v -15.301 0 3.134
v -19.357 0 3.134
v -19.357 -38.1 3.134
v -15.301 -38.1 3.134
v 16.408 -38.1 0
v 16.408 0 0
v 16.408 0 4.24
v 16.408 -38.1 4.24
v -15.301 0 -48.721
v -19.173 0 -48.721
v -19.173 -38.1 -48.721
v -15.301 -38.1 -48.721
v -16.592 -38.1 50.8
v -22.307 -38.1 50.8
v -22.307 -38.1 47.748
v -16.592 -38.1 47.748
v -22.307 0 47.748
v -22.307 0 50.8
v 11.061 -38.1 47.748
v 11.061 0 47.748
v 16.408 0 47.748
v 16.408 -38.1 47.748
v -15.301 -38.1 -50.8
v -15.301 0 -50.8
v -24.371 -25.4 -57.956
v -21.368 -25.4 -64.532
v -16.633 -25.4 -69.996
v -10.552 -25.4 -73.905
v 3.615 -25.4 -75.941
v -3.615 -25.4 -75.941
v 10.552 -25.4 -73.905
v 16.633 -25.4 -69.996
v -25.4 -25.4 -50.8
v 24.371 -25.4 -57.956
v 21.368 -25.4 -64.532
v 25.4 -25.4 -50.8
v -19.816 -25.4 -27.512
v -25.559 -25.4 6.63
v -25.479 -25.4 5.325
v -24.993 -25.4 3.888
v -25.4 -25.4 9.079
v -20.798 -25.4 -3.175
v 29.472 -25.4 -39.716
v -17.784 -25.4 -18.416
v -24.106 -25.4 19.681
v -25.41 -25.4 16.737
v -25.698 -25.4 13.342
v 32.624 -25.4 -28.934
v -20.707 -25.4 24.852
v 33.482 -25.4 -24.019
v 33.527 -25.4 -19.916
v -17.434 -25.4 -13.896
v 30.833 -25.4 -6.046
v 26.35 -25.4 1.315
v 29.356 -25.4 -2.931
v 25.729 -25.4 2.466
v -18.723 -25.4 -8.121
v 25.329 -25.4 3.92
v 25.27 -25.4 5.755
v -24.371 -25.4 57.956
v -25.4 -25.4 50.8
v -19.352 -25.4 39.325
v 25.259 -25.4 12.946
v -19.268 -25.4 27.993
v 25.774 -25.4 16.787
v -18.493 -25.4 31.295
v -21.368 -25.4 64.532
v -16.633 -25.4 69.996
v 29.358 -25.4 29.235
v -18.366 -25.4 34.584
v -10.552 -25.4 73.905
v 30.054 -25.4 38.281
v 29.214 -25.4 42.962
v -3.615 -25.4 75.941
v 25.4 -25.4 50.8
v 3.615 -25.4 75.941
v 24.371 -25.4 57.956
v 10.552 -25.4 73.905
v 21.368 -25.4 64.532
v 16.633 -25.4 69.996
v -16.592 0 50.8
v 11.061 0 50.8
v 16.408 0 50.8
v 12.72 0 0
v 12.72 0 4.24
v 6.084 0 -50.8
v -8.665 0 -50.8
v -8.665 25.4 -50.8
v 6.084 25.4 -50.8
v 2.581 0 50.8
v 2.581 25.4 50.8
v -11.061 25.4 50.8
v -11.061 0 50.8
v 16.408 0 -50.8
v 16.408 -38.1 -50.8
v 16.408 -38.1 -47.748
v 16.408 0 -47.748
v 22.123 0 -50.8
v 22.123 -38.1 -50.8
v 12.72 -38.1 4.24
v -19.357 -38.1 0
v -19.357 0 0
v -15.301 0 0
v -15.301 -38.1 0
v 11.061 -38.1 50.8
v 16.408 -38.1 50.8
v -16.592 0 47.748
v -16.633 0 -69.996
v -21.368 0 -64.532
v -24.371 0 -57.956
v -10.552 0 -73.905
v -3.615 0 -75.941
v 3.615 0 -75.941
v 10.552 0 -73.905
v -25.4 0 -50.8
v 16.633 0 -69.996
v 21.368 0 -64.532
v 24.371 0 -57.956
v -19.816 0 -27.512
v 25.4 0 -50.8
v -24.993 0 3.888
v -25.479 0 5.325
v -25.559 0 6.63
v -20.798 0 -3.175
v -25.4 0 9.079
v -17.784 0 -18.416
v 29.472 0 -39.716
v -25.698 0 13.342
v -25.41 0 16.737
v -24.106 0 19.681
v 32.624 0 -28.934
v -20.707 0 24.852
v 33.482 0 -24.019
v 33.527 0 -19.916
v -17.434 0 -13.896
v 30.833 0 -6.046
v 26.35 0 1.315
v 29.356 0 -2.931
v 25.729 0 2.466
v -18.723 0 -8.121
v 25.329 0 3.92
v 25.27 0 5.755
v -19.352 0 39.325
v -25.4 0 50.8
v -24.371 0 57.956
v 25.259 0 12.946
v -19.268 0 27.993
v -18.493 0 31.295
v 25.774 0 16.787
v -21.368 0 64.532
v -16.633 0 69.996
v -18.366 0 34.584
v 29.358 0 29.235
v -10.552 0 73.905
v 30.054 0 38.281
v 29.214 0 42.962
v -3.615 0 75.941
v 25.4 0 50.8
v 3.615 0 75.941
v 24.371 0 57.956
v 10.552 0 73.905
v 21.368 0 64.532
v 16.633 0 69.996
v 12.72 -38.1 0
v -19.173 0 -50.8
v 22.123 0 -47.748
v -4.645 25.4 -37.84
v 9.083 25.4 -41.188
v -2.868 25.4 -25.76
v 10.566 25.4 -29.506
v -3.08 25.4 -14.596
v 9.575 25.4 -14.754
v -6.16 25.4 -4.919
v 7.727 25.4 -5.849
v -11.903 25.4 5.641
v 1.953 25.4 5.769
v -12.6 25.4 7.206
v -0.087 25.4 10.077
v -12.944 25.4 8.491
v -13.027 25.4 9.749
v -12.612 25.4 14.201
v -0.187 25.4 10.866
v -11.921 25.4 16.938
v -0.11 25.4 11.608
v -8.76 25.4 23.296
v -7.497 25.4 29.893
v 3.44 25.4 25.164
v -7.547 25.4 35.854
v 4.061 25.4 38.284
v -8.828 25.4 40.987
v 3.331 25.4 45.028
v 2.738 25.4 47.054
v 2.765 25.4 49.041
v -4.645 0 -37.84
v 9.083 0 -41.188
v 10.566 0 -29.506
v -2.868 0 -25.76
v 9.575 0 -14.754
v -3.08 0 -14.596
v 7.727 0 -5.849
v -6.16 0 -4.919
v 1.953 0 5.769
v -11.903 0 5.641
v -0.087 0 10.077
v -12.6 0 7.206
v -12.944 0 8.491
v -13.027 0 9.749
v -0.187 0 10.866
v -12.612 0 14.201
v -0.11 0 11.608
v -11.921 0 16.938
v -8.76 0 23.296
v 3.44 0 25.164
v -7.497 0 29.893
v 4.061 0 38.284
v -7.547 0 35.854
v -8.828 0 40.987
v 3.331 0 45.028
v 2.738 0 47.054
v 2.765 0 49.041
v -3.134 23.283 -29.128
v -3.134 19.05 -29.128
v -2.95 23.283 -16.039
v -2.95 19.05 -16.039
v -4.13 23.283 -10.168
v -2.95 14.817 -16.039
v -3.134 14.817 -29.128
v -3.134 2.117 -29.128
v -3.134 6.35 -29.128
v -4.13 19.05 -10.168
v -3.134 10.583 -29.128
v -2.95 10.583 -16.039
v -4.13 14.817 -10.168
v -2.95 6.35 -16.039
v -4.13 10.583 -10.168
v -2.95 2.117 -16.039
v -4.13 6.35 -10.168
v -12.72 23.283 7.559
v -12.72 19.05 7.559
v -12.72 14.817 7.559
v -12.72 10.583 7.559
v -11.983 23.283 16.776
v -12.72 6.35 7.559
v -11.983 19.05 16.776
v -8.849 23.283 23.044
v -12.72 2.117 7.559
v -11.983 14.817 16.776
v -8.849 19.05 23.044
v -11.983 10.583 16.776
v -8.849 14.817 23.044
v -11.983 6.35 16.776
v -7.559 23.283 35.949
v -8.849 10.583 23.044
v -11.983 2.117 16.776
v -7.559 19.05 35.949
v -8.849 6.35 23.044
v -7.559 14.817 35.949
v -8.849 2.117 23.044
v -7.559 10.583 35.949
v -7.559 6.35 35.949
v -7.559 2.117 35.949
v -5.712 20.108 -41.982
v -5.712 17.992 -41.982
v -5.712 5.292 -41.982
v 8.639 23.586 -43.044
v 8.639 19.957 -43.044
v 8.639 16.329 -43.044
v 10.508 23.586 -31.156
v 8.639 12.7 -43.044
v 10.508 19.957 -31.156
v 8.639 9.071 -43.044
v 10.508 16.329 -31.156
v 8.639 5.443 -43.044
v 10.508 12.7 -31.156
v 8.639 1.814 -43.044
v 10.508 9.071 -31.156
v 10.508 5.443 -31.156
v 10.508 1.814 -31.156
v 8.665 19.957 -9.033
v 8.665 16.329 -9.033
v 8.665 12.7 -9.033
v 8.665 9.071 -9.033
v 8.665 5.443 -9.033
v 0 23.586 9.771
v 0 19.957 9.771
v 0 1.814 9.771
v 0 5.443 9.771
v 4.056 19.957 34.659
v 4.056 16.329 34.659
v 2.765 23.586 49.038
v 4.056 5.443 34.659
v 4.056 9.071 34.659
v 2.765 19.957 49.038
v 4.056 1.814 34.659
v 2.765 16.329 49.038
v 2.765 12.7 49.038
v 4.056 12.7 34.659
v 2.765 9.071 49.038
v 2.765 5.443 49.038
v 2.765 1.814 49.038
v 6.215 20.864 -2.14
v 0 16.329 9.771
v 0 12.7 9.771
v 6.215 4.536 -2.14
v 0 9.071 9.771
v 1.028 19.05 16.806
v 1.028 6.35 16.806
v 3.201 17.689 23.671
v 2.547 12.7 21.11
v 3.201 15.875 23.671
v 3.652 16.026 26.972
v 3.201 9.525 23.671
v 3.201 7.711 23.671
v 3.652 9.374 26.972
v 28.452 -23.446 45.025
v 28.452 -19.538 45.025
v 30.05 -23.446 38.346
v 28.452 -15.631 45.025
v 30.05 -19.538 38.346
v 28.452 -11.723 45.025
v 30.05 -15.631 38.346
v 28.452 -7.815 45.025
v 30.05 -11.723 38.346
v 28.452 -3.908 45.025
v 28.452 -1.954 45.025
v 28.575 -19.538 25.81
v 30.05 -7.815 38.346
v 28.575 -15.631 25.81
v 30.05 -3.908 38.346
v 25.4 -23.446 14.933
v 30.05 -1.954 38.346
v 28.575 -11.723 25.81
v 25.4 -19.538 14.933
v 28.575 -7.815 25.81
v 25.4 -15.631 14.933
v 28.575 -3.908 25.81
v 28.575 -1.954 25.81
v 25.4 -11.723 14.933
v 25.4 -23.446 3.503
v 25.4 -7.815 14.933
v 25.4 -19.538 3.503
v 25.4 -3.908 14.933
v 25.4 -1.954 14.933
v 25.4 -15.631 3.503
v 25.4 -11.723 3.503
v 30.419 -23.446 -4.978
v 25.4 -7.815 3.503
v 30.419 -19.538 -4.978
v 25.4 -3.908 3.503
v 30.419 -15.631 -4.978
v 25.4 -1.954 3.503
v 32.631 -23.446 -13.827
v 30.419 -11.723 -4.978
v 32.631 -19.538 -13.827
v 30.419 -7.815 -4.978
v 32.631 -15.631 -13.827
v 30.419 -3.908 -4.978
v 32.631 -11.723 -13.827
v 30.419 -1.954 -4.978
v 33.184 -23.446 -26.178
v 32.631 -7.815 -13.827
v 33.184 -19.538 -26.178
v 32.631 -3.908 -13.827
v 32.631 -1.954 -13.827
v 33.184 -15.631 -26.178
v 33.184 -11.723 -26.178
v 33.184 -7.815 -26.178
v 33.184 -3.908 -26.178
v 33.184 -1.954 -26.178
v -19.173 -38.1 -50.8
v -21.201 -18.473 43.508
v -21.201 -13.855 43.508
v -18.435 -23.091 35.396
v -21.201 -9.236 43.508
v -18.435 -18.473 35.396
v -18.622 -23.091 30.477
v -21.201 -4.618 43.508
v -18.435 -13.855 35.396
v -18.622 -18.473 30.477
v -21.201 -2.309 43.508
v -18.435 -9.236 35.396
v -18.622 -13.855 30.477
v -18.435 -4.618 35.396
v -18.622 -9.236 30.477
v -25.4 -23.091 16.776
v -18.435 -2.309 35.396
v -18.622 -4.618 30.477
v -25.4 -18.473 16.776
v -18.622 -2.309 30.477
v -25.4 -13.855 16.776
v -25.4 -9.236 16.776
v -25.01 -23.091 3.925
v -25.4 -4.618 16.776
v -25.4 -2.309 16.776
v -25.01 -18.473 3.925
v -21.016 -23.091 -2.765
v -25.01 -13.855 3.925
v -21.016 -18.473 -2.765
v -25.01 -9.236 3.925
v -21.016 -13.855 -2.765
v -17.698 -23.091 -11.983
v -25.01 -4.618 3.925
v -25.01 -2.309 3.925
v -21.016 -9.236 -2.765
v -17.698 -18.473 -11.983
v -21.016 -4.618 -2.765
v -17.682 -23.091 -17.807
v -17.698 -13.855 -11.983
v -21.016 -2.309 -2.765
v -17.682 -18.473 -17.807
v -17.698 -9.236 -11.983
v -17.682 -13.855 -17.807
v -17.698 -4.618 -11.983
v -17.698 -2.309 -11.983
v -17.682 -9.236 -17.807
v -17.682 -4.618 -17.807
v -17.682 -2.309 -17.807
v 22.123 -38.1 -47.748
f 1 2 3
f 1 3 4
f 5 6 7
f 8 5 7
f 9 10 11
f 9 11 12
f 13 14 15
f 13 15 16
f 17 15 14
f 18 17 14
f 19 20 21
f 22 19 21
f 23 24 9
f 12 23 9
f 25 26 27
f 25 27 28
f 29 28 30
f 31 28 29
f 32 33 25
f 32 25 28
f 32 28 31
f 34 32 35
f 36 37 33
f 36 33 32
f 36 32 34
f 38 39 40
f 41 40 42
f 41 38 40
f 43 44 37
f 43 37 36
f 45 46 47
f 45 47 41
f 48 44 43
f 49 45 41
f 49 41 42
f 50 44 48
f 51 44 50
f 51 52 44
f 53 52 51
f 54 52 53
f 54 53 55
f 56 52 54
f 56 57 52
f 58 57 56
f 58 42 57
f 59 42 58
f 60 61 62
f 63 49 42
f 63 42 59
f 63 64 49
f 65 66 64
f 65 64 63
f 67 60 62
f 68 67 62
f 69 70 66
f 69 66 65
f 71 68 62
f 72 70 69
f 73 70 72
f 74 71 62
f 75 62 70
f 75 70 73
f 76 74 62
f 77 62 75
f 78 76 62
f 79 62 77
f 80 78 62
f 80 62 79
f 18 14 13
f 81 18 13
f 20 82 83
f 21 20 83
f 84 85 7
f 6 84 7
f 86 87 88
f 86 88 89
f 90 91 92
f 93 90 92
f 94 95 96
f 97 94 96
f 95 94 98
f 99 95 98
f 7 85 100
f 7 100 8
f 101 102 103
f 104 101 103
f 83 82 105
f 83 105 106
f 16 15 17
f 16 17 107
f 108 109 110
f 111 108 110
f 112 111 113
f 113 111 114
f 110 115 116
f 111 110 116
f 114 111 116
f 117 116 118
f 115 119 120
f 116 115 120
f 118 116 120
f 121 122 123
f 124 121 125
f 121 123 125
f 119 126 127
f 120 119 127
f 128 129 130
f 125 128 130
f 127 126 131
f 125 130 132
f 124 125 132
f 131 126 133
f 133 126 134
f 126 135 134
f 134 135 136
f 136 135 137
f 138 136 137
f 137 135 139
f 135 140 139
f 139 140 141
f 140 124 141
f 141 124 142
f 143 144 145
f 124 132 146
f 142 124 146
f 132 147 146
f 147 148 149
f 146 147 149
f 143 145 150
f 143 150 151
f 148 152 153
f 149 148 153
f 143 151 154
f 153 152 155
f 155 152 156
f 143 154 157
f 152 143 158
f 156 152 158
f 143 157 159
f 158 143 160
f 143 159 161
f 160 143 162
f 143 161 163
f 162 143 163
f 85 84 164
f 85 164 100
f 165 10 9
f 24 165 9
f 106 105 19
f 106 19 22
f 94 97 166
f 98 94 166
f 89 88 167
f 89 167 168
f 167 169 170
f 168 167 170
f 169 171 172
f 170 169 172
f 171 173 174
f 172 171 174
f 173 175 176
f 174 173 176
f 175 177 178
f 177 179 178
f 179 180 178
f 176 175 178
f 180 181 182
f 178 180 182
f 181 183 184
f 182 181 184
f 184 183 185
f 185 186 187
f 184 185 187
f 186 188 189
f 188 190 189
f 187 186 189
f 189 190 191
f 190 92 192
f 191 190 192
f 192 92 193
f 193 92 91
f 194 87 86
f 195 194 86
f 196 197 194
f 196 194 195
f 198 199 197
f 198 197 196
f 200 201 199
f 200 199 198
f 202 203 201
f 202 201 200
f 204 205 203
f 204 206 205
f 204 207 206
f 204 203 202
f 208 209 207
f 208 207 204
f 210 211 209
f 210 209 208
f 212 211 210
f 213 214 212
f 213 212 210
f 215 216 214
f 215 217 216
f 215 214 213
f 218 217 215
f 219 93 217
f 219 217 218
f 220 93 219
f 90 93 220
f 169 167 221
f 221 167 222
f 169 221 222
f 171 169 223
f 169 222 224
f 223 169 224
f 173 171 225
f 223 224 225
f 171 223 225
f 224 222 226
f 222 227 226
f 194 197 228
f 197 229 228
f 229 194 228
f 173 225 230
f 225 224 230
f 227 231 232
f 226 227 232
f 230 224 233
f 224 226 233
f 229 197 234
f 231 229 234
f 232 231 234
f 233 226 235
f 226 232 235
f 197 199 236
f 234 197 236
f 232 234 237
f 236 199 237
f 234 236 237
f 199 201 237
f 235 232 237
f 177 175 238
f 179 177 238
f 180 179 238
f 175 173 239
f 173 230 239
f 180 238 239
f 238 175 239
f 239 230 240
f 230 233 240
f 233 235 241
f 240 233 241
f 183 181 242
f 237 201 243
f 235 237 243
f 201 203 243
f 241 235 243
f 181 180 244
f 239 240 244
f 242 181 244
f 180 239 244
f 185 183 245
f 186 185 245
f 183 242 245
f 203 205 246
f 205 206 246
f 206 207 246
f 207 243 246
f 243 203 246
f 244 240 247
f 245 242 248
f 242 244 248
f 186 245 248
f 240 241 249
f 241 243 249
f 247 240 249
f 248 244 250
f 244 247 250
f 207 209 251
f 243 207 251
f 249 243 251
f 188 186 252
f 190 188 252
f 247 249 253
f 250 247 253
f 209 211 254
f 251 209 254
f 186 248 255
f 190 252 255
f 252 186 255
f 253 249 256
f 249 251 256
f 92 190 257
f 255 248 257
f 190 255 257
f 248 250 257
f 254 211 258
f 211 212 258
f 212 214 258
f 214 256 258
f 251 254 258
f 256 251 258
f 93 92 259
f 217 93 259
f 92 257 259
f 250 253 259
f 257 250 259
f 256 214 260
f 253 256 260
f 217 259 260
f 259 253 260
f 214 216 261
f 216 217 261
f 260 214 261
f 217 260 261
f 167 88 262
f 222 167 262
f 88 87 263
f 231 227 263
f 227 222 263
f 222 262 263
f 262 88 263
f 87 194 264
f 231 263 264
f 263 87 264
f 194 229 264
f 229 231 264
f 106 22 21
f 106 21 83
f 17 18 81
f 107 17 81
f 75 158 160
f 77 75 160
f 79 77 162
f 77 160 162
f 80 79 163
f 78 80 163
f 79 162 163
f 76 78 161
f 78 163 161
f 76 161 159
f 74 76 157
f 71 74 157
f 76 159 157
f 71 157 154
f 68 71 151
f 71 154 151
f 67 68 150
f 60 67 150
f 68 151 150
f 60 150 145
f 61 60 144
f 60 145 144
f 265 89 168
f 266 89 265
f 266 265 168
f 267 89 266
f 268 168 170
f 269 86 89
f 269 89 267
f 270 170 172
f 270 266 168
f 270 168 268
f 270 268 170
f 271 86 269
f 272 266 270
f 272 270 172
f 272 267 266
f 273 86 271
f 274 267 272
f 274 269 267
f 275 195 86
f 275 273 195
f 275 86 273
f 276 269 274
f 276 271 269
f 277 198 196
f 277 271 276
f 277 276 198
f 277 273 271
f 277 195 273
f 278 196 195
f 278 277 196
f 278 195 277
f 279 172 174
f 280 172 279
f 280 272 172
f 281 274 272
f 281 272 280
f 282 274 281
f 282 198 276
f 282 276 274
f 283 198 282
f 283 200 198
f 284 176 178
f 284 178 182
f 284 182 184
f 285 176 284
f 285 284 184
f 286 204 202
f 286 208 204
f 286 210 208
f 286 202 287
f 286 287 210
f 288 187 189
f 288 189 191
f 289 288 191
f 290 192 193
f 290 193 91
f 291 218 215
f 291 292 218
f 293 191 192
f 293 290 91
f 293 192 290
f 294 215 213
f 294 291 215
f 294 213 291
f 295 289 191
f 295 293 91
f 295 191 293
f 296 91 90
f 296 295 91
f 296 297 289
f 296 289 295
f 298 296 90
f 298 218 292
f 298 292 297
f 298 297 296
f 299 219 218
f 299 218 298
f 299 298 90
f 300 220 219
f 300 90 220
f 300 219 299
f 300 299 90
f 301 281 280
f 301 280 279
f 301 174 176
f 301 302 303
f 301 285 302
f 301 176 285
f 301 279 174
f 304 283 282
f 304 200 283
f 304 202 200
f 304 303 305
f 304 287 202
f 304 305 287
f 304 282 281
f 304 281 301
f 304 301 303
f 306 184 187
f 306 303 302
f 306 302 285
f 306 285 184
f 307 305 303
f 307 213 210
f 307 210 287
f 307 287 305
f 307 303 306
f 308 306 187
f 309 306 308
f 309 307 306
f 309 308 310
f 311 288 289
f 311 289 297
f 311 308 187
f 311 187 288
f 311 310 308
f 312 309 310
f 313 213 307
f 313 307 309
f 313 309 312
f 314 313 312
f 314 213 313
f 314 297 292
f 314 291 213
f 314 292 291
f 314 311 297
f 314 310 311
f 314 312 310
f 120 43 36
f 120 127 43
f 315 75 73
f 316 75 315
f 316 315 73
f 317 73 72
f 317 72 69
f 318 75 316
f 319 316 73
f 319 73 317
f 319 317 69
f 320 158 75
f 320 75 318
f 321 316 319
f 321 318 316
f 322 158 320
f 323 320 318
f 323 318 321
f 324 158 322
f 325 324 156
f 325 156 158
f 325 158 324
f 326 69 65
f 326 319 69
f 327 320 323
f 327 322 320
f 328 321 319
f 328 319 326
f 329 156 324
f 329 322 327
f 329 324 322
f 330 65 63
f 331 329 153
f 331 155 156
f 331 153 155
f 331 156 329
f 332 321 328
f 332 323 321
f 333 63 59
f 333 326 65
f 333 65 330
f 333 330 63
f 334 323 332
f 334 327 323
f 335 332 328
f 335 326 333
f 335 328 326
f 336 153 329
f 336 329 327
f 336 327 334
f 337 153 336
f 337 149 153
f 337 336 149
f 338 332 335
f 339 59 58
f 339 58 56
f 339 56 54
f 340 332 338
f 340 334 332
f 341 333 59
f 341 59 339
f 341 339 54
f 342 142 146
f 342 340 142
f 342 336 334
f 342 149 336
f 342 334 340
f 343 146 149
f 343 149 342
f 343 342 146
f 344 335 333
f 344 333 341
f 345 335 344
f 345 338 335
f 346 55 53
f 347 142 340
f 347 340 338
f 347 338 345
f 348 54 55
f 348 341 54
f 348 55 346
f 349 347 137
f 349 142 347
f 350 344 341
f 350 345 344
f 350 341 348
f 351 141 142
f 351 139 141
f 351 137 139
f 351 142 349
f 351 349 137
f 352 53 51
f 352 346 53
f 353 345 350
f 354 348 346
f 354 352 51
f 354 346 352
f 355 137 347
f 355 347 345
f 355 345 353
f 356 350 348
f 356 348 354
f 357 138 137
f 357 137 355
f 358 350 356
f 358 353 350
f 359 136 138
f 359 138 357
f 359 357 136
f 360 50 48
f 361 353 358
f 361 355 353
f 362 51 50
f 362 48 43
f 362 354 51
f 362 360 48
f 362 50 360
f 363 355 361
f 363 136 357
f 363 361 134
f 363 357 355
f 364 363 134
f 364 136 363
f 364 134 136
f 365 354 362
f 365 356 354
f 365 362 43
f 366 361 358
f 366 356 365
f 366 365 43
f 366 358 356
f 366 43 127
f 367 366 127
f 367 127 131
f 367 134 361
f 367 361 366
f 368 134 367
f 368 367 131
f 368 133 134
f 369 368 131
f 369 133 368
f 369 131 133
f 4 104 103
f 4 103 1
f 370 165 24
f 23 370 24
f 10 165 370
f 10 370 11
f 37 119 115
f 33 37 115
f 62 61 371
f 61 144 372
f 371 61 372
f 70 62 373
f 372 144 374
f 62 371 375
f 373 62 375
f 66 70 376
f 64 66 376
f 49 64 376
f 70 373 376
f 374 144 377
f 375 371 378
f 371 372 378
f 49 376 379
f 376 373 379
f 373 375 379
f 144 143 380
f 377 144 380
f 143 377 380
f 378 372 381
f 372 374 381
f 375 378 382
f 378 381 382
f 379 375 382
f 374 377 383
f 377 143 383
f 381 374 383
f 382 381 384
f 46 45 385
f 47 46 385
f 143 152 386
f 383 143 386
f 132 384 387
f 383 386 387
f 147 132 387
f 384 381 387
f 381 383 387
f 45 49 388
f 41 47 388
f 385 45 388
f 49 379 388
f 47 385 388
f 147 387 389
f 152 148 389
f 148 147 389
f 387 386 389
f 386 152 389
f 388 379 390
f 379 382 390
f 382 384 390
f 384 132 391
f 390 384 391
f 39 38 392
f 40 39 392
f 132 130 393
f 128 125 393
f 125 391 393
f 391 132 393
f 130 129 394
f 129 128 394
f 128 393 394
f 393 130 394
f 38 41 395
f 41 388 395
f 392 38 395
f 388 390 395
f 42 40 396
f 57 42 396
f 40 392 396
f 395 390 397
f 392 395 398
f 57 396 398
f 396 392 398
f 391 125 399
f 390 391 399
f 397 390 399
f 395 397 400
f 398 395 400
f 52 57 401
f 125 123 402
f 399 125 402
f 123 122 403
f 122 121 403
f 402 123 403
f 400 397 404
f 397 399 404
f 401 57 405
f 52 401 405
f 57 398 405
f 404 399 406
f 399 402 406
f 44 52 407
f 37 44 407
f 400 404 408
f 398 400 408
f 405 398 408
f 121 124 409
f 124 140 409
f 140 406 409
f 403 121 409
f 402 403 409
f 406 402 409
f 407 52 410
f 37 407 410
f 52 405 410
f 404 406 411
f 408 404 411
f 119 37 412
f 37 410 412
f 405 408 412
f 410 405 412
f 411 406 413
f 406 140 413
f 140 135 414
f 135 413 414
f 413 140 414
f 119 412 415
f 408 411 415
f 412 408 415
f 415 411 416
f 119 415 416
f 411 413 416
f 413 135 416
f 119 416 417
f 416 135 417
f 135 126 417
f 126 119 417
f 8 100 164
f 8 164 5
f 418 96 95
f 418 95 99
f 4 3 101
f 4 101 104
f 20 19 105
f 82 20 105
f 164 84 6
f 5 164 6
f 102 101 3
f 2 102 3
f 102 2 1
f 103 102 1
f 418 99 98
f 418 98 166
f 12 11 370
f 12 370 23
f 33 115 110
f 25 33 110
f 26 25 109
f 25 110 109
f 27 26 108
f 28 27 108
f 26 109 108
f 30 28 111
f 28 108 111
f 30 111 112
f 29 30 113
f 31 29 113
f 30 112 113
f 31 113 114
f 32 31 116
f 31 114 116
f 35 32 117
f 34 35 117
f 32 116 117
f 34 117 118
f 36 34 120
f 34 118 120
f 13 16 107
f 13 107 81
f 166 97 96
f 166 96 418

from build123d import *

# Parameters (mm, degrees)
F0_W     = 3.687097691
F0_H     = 4.2401612736
F0_W_2   = 4.0558064356
F0_H_2   = 3.1340322457
F0_W_3   = 5.7149995118
F0_H_3   = 3.0520937026
F0_W_4   = 3.871451132
F0_H_4   = 2.0791524881
F0_W_5   = 5.7150013745
F0_W_6   = 5.3462898359
F1_DEPTH = 25.4
F2_DEPTH = 25.4
F3_DEPTH = 25.4
F4_DEPTH = 38.1


with BuildPart() as f1:
    # F0 (on Front) → F1 (new body)
    with BuildSketch(Plane.XZ):
        with BuildLine():
            ThreePointArc((-25.4, -50.8), (0, -76.2), (25.4, -50.8))
            Line((25.4, -50.8), (22.1225824207, -50.8))
            Line((22.1225824207, -50.8), (16.4075810462, -50.8))
            Line((16.4075810462, -50.8), (6.0837119818, -50.8))
            Line((6.0837119818, -50.8), (-8.6646769196, -50.8))
            Line((-8.6646769196, -50.8), (-15.3014520183, -50.8))
            Line((-15.3014520183, -50.8), (-19.1729031503, -50.8))
            Line((-19.1729031503, -50.8), (-25.4, -50.8))
        make_face()
        with BuildLine():
            add(Edge.make_bspline(
                [(25.4, 50.8), (26.4777169783, 48.9479202677), (28.6861178129, 45.1527360877), (30.6932831349, 38.2079324244), (29.2102996032, 25.6833194496), (24.6181151455, 15.2644920213), (25.7208382238, 8.8851894458), (24.8210743035, 3.3793927812), (27.3376351659, -0.1317957862), (31.0361416521, -4.8152447407), (32.6289703178, -13.8253537267), (33.7770047901, -20.2747103968), (33.428230529, -26.4357670674), (30.3215961917, -37.8680055499), (27.0946961941, -46.3470134235), (25.4, -50.8)],
                knots=[0, 0, 0, 0, 0.0692376704, 0.1418781853, 0.2392837533, 0.3315708581, 0.4002107054, 0.4625003579, 0.5171786982, 0.583671378, 0.6664731761, 0.7364677518, 0.8031231248, 0.8966046387, 1, 1, 1, 1], degree=3))
            Line((25.4, 50.8), (16.4075810462, 50.8))
            Line((16.4075810462, 50.8), (16.4075810462, 47.7479062974))
            Line((16.4075810462, 47.7479062974), (11.0612912104, 47.7479062974))
            Line((11.0612912104, 47.7479062974), (11.0612912104, 50.8))
            Line((11.0612912104, 50.8), (2.5809679646, 50.8))
            add(Edge.make_bspline(
                [(6.0837119818, -50.8), (6.7526639673, -49.080617066), (8.4312184516, -44.7662895858), (11.3526863866, -31.110646258), (9.7718678352, -16.7741945721), (8.9898940513, -8.9270108424), (5.746817019, -0.2348690969), (-0.5661221974, 9.6149802874), (0.0008754514, 12.054506702), (1.1370686549, 18.126460212), (3.4894802849, 22.4144521985), (4.2460147527, 34.4624233221), (3.960019898, 44.2593532606), (2.5398283889, 46.6632712676), (2.8657296807, 49.0471311706), (2.6723084934, 50.2377475739), (2.5809679646, 50.8)],
                knots=[0, 0, 0, 0, 0.0680835046, 0.1708371819, 0.2755848247, 0.3513981135, 0.4367786008, 0.5279622658, 0.5704266042, 0.6357952172, 0.6975722078, 0.7934500663, 0.8792600663, 0.9226956826, 0.963494086, 1, 1, 1, 1], degree=3))
            Line((6.0837119818, -50.8), (16.4075810462, -50.8))
            Line((16.4075810462, -50.8), (16.4075810462, -47.7479062974))
            Line((16.4075810462, -47.7479062974), (22.1225824207, -47.7479062974))
            Line((22.1225824207, -47.7479062974), (22.1225824207, -50.8))
            Line((22.1225824207, -50.8), (25.4, -50.8))
        make_face()
        with Locations((14.5640322007, 2.1200806368)):
            Rectangle(F0_W, F0_H, mode=Mode.SUBTRACT)
        with BuildLine():
            Line((-22.3069358617, 50.8), (-25.4, 50.8))
            add(Edge.make_bspline(
                [(-25.4, 50.8), (-23.9457888424, 48.4062601984), (-21.0240229952, 43.5968161487), (-17.5382201021, 35.4945567937), (-19.2672156417, 25.1355979551), (-26.9197620067, 17.5072559241), (-24.8862082187, 9.032964073), (-26.3256337578, 4.7152512749), (-20.356751104, -2.5534247793), (-17.4203871867, -11.891004327), (-17.2704408034, -16.799434963), (-19.7618335753, -27.3251135996), (-23.2563408131, -41.8747303107), (-25.4, -50.8)],
                knots=[0, 0, 0, 0, 0.0868305692, 0.1744578772, 0.2688447789, 0.3645550375, 0.4478464969, 0.508128426, 0.5974149732, 0.6911047095, 0.7553911578, 0.8499479452, 1, 1, 1, 1], degree=3))
            Line((-25.4, -50.8), (-19.1729031503, -50.8))
            Line((-19.1729031503, -50.8), (-19.1729031503, -48.7208475119))
            Line((-19.1729031503, -48.7208475119), (-15.3014520183, -48.7208475119))
            Line((-15.3014520183, -48.7208475119), (-15.3014520183, -50.8))
            Line((-15.3014520183, -50.8), (-8.6646769196, -50.8))
            add(Edge.make_bspline(
                [(-8.6646769196, -50.8), (-7.8882136411, -48.7208475119), (-5.9978741559, -43.6590446512), (-2.4524628144, -29.5189412564), (-2.8134786099, -16.0801708021), (-3.4674009438, -11.6014648726), (-7.2501120433, -1.4562577191), (-13.4067600488, 7.2161554479), (-12.8603591818, 11.3475544545), (-12.4979329814, 17.3130331381), (-7.8686094851, 22.6070259059), (-6.7588523591, 36.2531826531), (-9.6606783541, 42.5298504496), (-10.5829903078, 47.9757970771), (-11.061290279, 50.8)],
                knots=[0, 0, 0, 0, 0.0775376634, 0.1887693993, 0.2924121888, 0.3530814771, 0.4470014848, 0.5397176399, 0.5961130824, 0.6628348922, 0.7386673918, 0.8418289129, 0.917974362, 1, 1, 1, 1], degree=3))
            Line((-11.061290279, 50.8), (-16.5919363499, 50.8))
            Line((-16.5919363499, 50.8), (-16.5919363499, 47.7479062974))
            Line((-16.5919363499, 47.7479062974), (-22.3069358617, 47.7479062974))
            Line((-22.3069358617, 47.7479062974), (-22.3069358617, 50.8))
        make_face()
        with Locations((-17.3293552361, 1.5670161229)):
            Rectangle(F0_W_2, F0_H_2, mode=Mode.SUBTRACT)
        with BuildLine():
            Line((16.4075810462, 50.8), (25.4, 50.8))
            ThreePointArc((25.4, 50.8), (0, 76.2), (-25.4, 50.8))
            Line((-25.4, 50.8), (-22.3069358617, 50.8))
            Line((-22.3069358617, 50.8), (-16.5919363499, 50.8))
            Line((-16.5919363499, 50.8), (-11.061290279, 50.8))
            Line((-11.061290279, 50.8), (2.5809679646, 50.8))
            Line((2.5809679646, 50.8), (11.0612912104, 50.8))
            Line((11.0612912104, 50.8), (16.4075810462, 50.8))
        make_face()
        with Locations((-19.4494361058, 49.2739531487)):
            Rectangle(F0_W_3, F0_H_3)
        with BuildLine():
            add(Edge.make_bspline(
                [(6.0837119818, -50.8), (6.7526639673, -49.080617066), (8.4312184516, -44.7662895858), (11.3526863866, -31.110646258), (9.7718678352, -16.7741945721), (8.9898940513, -8.9270108424), (5.746817019, -0.2348690969), (-0.5661221974, 9.6149802874), (0.0008754514, 12.054506702), (1.1370686549, 18.126460212), (3.4894802849, 22.4144521985), (4.2460147527, 34.4624233221), (3.960019898, 44.2593532606), (2.5398283889, 46.6632712676), (2.8657296807, 49.0471311706), (2.6723084934, 50.2377475739), (2.5809679646, 50.8)],
                knots=[0, 0, 0, 0, 0.0680835046, 0.1708371819, 0.2755848247, 0.3513981135, 0.4367786008, 0.5279622658, 0.5704266042, 0.6357952172, 0.6975722078, 0.7934500663, 0.8792600663, 0.9226956826, 0.963494086, 1, 1, 1, 1], degree=3))
            Line((2.5809679646, 50.8), (-11.061290279, 50.8))
            add(Edge.make_bspline(
                [(-8.6646769196, -50.8), (-7.8882136411, -48.7208475119), (-5.9978741559, -43.6590446512), (-2.4524628144, -29.5189412564), (-2.8134786099, -16.0801708021), (-3.4674009438, -11.6014648726), (-7.2501120433, -1.4562577191), (-13.4067600488, 7.2161554479), (-12.8603591818, 11.3475544545), (-12.4979329814, 17.3130331381), (-7.8686094851, 22.6070259059), (-6.7588523591, 36.2531826531), (-9.6606783541, 42.5298504496), (-10.5829903078, 47.9757970771), (-11.061290279, 50.8)],
                knots=[0, 0, 0, 0, 0.0775376634, 0.1887693993, 0.2924121888, 0.3530814771, 0.4470014848, 0.5397176399, 0.5961130824, 0.6628348922, 0.7386673918, 0.8418289129, 0.917974362, 1, 1, 1, 1], degree=3))
            Line((-8.6646769196, -50.8), (6.0837119818, -50.8))
        make_face()
        with Locations((-17.3293552361, 1.5670161229)):
            Rectangle(F0_W_2, F0_H_2)
        with Locations((-17.2371775843, -49.7604237559)):
            Rectangle(F0_W_4, F0_H_4)
        with Locations((19.2650817335, -49.2739531487)):
            Rectangle(F0_W_5, F0_H_3)
        with Locations((14.5640322007, 2.1200806368)):
            Rectangle(F0_W, F0_H)
        with Locations((13.7344361283, 49.2739531487)):
            Rectangle(F0_W_6, F0_H_3)
    extrude(amount=F1_DEPTH)

    # F0 (on Front) → F2 (join)
    with BuildSketch(Plane.XZ):
        with BuildLine():
            add(Edge.make_bspline(
                [(25.4, 50.8), (26.4777169783, 48.9479202677), (28.6861178129, 45.1527360877), (30.6932831349, 38.2079324244), (29.2102996032, 25.6833194496), (24.6181151455, 15.2644920213), (25.7208382238, 8.8851894458), (24.8210743035, 3.3793927812), (27.3376351659, -0.1317957862), (31.0361416521, -4.8152447407), (32.6289703178, -13.8253537267), (33.7770047901, -20.2747103968), (33.428230529, -26.4357670674), (30.3215961917, -37.8680055499), (27.0946961941, -46.3470134235), (25.4, -50.8)],
                knots=[0, 0, 0, 0, 0.0692376704, 0.1418781853, 0.2392837533, 0.3315708581, 0.4002107054, 0.4625003579, 0.5171786982, 0.583671378, 0.6664731761, 0.7364677518, 0.8031231248, 0.8966046387, 1, 1, 1, 1], degree=3))
            Line((25.4, 50.8), (16.4075810462, 50.8))
            Line((16.4075810462, 50.8), (16.4075810462, 47.7479062974))
            Line((16.4075810462, 47.7479062974), (11.0612912104, 47.7479062974))
            Line((11.0612912104, 47.7479062974), (11.0612912104, 50.8))
            Line((11.0612912104, 50.8), (2.5809679646, 50.8))
            add(Edge.make_bspline(
                [(6.0837119818, -50.8), (6.7526639673, -49.080617066), (8.4312184516, -44.7662895858), (11.3526863866, -31.110646258), (9.7718678352, -16.7741945721), (8.9898940513, -8.9270108424), (5.746817019, -0.2348690969), (-0.5661221974, 9.6149802874), (0.0008754514, 12.054506702), (1.1370686549, 18.126460212), (3.4894802849, 22.4144521985), (4.2460147527, 34.4624233221), (3.960019898, 44.2593532606), (2.5398283889, 46.6632712676), (2.8657296807, 49.0471311706), (2.6723084934, 50.2377475739), (2.5809679646, 50.8)],
                knots=[0, 0, 0, 0, 0.0680835046, 0.1708371819, 0.2755848247, 0.3513981135, 0.4367786008, 0.5279622658, 0.5704266042, 0.6357952172, 0.6975722078, 0.7934500663, 0.8792600663, 0.9226956826, 0.963494086, 1, 1, 1, 1], degree=3))
            Line((6.0837119818, -50.8), (16.4075810462, -50.8))
            Line((16.4075810462, -50.8), (16.4075810462, -47.7479062974))
            Line((16.4075810462, -47.7479062974), (22.1225824207, -47.7479062974))
            Line((22.1225824207, -47.7479062974), (22.1225824207, -50.8))
            Line((22.1225824207, -50.8), (25.4, -50.8))
        make_face()
        with Locations((14.5640322007, 2.1200806368)):
            Rectangle(F0_W, F0_H, mode=Mode.SUBTRACT)
        with BuildLine():
            Line((16.4075810462, 50.8), (25.4, 50.8))
            ThreePointArc((25.4, 50.8), (0, 76.2), (-25.4, 50.8))
            Line((-25.4, 50.8), (-22.3069358617, 50.8))
            Line((-22.3069358617, 50.8), (-16.5919363499, 50.8))
            Line((-16.5919363499, 50.8), (-11.061290279, 50.8))
            Line((-11.061290279, 50.8), (2.5809679646, 50.8))
            Line((2.5809679646, 50.8), (11.0612912104, 50.8))
            Line((11.0612912104, 50.8), (16.4075810462, 50.8))
        make_face()
        with BuildLine():
            Line((-22.3069358617, 50.8), (-25.4, 50.8))
            add(Edge.make_bspline(
                [(-25.4, 50.8), (-23.9457888424, 48.4062601984), (-21.0240229952, 43.5968161487), (-17.5382201021, 35.4945567937), (-19.2672156417, 25.1355979551), (-26.9197620067, 17.5072559241), (-24.8862082187, 9.032964073), (-26.3256337578, 4.7152512749), (-20.356751104, -2.5534247793), (-17.4203871867, -11.891004327), (-17.2704408034, -16.799434963), (-19.7618335753, -27.3251135996), (-23.2563408131, -41.8747303107), (-25.4, -50.8)],
                knots=[0, 0, 0, 0, 0.0868305692, 0.1744578772, 0.2688447789, 0.3645550375, 0.4478464969, 0.508128426, 0.5974149732, 0.6911047095, 0.7553911578, 0.8499479452, 1, 1, 1, 1], degree=3))
            Line((-25.4, -50.8), (-19.1729031503, -50.8))
            Line((-19.1729031503, -50.8), (-19.1729031503, -48.7208475119))
            Line((-19.1729031503, -48.7208475119), (-15.3014520183, -48.7208475119))
            Line((-15.3014520183, -48.7208475119), (-15.3014520183, -50.8))
            Line((-15.3014520183, -50.8), (-8.6646769196, -50.8))
            add(Edge.make_bspline(
                [(-8.6646769196, -50.8), (-7.8882136411, -48.7208475119), (-5.9978741559, -43.6590446512), (-2.4524628144, -29.5189412564), (-2.8134786099, -16.0801708021), (-3.4674009438, -11.6014648726), (-7.2501120433, -1.4562577191), (-13.4067600488, 7.2161554479), (-12.8603591818, 11.3475544545), (-12.4979329814, 17.3130331381), (-7.8686094851, 22.6070259059), (-6.7588523591, 36.2531826531), (-9.6606783541, 42.5298504496), (-10.5829903078, 47.9757970771), (-11.061290279, 50.8)],
                knots=[0, 0, 0, 0, 0.0775376634, 0.1887693993, 0.2924121888, 0.3530814771, 0.4470014848, 0.5397176399, 0.5961130824, 0.6628348922, 0.7386673918, 0.8418289129, 0.917974362, 1, 1, 1, 1], degree=3))
            Line((-11.061290279, 50.8), (-16.5919363499, 50.8))
            Line((-16.5919363499, 50.8), (-16.5919363499, 47.7479062974))
            Line((-16.5919363499, 47.7479062974), (-22.3069358617, 47.7479062974))
            Line((-22.3069358617, 47.7479062974), (-22.3069358617, 50.8))
        make_face()
        with Locations((-17.3293552361, 1.5670161229)):
            Rectangle(F0_W_2, F0_H_2, mode=Mode.SUBTRACT)
        with BuildLine():
            ThreePointArc((-25.4, -50.8), (0, -76.2), (25.4, -50.8))
            Line((25.4, -50.8), (22.1225824207, -50.8))
            Line((22.1225824207, -50.8), (16.4075810462, -50.8))
            Line((16.4075810462, -50.8), (6.0837119818, -50.8))
            Line((6.0837119818, -50.8), (-8.6646769196, -50.8))
            Line((-8.6646769196, -50.8), (-15.3014520183, -50.8))
            Line((-15.3014520183, -50.8), (-19.1729031503, -50.8))
            Line((-19.1729031503, -50.8), (-25.4, -50.8))
        make_face()
    extrude(amount=F2_DEPTH)


with BuildPart() as f3:
    # F0 (on Front) → F3 (new body)
    with BuildSketch(Plane.XZ):
        with BuildLine():
            add(Edge.make_bspline(
                [(6.0837119818, -50.8), (6.7526639673, -49.080617066), (8.4312184516, -44.7662895858), (11.3526863866, -31.110646258), (9.7718678352, -16.7741945721), (8.9898940513, -8.9270108424), (5.746817019, -0.2348690969), (-0.5661221974, 9.6149802874), (0.0008754514, 12.054506702), (1.1370686549, 18.126460212), (3.4894802849, 22.4144521985), (4.2460147527, 34.4624233221), (3.960019898, 44.2593532606), (2.5398283889, 46.6632712676), (2.8657296807, 49.0471311706), (2.6723084934, 50.2377475739), (2.5809679646, 50.8)],
                knots=[0, 0, 0, 0, 0.0680835046, 0.1708371819, 0.2755848247, 0.3513981135, 0.4367786008, 0.5279622658, 0.5704266042, 0.6357952172, 0.6975722078, 0.7934500663, 0.8792600663, 0.9226956826, 0.963494086, 1, 1, 1, 1], degree=3))
            Line((2.5809679646, 50.8), (-11.061290279, 50.8))
            add(Edge.make_bspline(
                [(-8.6646769196, -50.8), (-7.8882136411, -48.7208475119), (-5.9978741559, -43.6590446512), (-2.4524628144, -29.5189412564), (-2.8134786099, -16.0801708021), (-3.4674009438, -11.6014648726), (-7.2501120433, -1.4562577191), (-13.4067600488, 7.2161554479), (-12.8603591818, 11.3475544545), (-12.4979329814, 17.3130331381), (-7.8686094851, 22.6070259059), (-6.7588523591, 36.2531826531), (-9.6606783541, 42.5298504496), (-10.5829903078, 47.9757970771), (-11.061290279, 50.8)],
                knots=[0, 0, 0, 0, 0.0775376634, 0.1887693993, 0.2924121888, 0.3530814771, 0.4470014848, 0.5397176399, 0.5961130824, 0.6628348922, 0.7386673918, 0.8418289129, 0.917974362, 1, 1, 1, 1], degree=3))
            Line((-8.6646769196, -50.8), (6.0837119818, -50.8))
        make_face()
    extrude(amount=-F3_DEPTH)


with BuildPart() as f4:
    # F0 (on Front) → F4 (new body)
    with BuildSketch(Plane.XZ):
        with Locations((-19.4494361058, 49.2739531487)):
            Rectangle(F0_W_3, F0_H_3)
    extrude(amount=F4_DEPTH)


with BuildPart() as f4b:
    # F0 (on Front) → F4, piece 2 (new body)
    with BuildSketch(Plane.XZ):
        with Locations((13.7344361283, 49.2739531487)):
            Rectangle(F0_W_6, F0_H_3)
    extrude(amount=F4_DEPTH)


with BuildPart() as f4c:
    # F0 (on Front) → F4, piece 3 (new body)
    with BuildSketch(Plane.XZ):
        with Locations((14.5640322007, 2.1200806368)):
            Rectangle(F0_W, F0_H)
    extrude(amount=F4_DEPTH)


with BuildPart() as f4d:
    # F0 (on Front) → F4, piece 4 (new body)
    with BuildSketch(Plane.XZ):
        with Locations((-17.3293552361, 1.5670161229)):
            Rectangle(F0_W_2, F0_H_2)
    extrude(amount=F4_DEPTH)


with BuildPart() as f4e:
    # F0 (on Front) → F4, piece 5 (new body)
    with BuildSketch(Plane.XZ):
        with Locations((-17.2371775843, -49.7604237559)):
            Rectangle(F0_W_4, F0_H_4)
    extrude(amount=F4_DEPTH)


with BuildPart() as f4f:
    # F0 (on Front) → F4, piece 6 (new body)
    with BuildSketch(Plane.XZ):
        with Locations((19.2650817335, -49.2739531487)):
            Rectangle(F0_W_5, F0_H_3)
    extrude(amount=F4_DEPTH)


solid = Compound([f1.part, f3.part, f4.part, f4b.part, f4c.part, f4d.part, f4e.part, f4f.part])
